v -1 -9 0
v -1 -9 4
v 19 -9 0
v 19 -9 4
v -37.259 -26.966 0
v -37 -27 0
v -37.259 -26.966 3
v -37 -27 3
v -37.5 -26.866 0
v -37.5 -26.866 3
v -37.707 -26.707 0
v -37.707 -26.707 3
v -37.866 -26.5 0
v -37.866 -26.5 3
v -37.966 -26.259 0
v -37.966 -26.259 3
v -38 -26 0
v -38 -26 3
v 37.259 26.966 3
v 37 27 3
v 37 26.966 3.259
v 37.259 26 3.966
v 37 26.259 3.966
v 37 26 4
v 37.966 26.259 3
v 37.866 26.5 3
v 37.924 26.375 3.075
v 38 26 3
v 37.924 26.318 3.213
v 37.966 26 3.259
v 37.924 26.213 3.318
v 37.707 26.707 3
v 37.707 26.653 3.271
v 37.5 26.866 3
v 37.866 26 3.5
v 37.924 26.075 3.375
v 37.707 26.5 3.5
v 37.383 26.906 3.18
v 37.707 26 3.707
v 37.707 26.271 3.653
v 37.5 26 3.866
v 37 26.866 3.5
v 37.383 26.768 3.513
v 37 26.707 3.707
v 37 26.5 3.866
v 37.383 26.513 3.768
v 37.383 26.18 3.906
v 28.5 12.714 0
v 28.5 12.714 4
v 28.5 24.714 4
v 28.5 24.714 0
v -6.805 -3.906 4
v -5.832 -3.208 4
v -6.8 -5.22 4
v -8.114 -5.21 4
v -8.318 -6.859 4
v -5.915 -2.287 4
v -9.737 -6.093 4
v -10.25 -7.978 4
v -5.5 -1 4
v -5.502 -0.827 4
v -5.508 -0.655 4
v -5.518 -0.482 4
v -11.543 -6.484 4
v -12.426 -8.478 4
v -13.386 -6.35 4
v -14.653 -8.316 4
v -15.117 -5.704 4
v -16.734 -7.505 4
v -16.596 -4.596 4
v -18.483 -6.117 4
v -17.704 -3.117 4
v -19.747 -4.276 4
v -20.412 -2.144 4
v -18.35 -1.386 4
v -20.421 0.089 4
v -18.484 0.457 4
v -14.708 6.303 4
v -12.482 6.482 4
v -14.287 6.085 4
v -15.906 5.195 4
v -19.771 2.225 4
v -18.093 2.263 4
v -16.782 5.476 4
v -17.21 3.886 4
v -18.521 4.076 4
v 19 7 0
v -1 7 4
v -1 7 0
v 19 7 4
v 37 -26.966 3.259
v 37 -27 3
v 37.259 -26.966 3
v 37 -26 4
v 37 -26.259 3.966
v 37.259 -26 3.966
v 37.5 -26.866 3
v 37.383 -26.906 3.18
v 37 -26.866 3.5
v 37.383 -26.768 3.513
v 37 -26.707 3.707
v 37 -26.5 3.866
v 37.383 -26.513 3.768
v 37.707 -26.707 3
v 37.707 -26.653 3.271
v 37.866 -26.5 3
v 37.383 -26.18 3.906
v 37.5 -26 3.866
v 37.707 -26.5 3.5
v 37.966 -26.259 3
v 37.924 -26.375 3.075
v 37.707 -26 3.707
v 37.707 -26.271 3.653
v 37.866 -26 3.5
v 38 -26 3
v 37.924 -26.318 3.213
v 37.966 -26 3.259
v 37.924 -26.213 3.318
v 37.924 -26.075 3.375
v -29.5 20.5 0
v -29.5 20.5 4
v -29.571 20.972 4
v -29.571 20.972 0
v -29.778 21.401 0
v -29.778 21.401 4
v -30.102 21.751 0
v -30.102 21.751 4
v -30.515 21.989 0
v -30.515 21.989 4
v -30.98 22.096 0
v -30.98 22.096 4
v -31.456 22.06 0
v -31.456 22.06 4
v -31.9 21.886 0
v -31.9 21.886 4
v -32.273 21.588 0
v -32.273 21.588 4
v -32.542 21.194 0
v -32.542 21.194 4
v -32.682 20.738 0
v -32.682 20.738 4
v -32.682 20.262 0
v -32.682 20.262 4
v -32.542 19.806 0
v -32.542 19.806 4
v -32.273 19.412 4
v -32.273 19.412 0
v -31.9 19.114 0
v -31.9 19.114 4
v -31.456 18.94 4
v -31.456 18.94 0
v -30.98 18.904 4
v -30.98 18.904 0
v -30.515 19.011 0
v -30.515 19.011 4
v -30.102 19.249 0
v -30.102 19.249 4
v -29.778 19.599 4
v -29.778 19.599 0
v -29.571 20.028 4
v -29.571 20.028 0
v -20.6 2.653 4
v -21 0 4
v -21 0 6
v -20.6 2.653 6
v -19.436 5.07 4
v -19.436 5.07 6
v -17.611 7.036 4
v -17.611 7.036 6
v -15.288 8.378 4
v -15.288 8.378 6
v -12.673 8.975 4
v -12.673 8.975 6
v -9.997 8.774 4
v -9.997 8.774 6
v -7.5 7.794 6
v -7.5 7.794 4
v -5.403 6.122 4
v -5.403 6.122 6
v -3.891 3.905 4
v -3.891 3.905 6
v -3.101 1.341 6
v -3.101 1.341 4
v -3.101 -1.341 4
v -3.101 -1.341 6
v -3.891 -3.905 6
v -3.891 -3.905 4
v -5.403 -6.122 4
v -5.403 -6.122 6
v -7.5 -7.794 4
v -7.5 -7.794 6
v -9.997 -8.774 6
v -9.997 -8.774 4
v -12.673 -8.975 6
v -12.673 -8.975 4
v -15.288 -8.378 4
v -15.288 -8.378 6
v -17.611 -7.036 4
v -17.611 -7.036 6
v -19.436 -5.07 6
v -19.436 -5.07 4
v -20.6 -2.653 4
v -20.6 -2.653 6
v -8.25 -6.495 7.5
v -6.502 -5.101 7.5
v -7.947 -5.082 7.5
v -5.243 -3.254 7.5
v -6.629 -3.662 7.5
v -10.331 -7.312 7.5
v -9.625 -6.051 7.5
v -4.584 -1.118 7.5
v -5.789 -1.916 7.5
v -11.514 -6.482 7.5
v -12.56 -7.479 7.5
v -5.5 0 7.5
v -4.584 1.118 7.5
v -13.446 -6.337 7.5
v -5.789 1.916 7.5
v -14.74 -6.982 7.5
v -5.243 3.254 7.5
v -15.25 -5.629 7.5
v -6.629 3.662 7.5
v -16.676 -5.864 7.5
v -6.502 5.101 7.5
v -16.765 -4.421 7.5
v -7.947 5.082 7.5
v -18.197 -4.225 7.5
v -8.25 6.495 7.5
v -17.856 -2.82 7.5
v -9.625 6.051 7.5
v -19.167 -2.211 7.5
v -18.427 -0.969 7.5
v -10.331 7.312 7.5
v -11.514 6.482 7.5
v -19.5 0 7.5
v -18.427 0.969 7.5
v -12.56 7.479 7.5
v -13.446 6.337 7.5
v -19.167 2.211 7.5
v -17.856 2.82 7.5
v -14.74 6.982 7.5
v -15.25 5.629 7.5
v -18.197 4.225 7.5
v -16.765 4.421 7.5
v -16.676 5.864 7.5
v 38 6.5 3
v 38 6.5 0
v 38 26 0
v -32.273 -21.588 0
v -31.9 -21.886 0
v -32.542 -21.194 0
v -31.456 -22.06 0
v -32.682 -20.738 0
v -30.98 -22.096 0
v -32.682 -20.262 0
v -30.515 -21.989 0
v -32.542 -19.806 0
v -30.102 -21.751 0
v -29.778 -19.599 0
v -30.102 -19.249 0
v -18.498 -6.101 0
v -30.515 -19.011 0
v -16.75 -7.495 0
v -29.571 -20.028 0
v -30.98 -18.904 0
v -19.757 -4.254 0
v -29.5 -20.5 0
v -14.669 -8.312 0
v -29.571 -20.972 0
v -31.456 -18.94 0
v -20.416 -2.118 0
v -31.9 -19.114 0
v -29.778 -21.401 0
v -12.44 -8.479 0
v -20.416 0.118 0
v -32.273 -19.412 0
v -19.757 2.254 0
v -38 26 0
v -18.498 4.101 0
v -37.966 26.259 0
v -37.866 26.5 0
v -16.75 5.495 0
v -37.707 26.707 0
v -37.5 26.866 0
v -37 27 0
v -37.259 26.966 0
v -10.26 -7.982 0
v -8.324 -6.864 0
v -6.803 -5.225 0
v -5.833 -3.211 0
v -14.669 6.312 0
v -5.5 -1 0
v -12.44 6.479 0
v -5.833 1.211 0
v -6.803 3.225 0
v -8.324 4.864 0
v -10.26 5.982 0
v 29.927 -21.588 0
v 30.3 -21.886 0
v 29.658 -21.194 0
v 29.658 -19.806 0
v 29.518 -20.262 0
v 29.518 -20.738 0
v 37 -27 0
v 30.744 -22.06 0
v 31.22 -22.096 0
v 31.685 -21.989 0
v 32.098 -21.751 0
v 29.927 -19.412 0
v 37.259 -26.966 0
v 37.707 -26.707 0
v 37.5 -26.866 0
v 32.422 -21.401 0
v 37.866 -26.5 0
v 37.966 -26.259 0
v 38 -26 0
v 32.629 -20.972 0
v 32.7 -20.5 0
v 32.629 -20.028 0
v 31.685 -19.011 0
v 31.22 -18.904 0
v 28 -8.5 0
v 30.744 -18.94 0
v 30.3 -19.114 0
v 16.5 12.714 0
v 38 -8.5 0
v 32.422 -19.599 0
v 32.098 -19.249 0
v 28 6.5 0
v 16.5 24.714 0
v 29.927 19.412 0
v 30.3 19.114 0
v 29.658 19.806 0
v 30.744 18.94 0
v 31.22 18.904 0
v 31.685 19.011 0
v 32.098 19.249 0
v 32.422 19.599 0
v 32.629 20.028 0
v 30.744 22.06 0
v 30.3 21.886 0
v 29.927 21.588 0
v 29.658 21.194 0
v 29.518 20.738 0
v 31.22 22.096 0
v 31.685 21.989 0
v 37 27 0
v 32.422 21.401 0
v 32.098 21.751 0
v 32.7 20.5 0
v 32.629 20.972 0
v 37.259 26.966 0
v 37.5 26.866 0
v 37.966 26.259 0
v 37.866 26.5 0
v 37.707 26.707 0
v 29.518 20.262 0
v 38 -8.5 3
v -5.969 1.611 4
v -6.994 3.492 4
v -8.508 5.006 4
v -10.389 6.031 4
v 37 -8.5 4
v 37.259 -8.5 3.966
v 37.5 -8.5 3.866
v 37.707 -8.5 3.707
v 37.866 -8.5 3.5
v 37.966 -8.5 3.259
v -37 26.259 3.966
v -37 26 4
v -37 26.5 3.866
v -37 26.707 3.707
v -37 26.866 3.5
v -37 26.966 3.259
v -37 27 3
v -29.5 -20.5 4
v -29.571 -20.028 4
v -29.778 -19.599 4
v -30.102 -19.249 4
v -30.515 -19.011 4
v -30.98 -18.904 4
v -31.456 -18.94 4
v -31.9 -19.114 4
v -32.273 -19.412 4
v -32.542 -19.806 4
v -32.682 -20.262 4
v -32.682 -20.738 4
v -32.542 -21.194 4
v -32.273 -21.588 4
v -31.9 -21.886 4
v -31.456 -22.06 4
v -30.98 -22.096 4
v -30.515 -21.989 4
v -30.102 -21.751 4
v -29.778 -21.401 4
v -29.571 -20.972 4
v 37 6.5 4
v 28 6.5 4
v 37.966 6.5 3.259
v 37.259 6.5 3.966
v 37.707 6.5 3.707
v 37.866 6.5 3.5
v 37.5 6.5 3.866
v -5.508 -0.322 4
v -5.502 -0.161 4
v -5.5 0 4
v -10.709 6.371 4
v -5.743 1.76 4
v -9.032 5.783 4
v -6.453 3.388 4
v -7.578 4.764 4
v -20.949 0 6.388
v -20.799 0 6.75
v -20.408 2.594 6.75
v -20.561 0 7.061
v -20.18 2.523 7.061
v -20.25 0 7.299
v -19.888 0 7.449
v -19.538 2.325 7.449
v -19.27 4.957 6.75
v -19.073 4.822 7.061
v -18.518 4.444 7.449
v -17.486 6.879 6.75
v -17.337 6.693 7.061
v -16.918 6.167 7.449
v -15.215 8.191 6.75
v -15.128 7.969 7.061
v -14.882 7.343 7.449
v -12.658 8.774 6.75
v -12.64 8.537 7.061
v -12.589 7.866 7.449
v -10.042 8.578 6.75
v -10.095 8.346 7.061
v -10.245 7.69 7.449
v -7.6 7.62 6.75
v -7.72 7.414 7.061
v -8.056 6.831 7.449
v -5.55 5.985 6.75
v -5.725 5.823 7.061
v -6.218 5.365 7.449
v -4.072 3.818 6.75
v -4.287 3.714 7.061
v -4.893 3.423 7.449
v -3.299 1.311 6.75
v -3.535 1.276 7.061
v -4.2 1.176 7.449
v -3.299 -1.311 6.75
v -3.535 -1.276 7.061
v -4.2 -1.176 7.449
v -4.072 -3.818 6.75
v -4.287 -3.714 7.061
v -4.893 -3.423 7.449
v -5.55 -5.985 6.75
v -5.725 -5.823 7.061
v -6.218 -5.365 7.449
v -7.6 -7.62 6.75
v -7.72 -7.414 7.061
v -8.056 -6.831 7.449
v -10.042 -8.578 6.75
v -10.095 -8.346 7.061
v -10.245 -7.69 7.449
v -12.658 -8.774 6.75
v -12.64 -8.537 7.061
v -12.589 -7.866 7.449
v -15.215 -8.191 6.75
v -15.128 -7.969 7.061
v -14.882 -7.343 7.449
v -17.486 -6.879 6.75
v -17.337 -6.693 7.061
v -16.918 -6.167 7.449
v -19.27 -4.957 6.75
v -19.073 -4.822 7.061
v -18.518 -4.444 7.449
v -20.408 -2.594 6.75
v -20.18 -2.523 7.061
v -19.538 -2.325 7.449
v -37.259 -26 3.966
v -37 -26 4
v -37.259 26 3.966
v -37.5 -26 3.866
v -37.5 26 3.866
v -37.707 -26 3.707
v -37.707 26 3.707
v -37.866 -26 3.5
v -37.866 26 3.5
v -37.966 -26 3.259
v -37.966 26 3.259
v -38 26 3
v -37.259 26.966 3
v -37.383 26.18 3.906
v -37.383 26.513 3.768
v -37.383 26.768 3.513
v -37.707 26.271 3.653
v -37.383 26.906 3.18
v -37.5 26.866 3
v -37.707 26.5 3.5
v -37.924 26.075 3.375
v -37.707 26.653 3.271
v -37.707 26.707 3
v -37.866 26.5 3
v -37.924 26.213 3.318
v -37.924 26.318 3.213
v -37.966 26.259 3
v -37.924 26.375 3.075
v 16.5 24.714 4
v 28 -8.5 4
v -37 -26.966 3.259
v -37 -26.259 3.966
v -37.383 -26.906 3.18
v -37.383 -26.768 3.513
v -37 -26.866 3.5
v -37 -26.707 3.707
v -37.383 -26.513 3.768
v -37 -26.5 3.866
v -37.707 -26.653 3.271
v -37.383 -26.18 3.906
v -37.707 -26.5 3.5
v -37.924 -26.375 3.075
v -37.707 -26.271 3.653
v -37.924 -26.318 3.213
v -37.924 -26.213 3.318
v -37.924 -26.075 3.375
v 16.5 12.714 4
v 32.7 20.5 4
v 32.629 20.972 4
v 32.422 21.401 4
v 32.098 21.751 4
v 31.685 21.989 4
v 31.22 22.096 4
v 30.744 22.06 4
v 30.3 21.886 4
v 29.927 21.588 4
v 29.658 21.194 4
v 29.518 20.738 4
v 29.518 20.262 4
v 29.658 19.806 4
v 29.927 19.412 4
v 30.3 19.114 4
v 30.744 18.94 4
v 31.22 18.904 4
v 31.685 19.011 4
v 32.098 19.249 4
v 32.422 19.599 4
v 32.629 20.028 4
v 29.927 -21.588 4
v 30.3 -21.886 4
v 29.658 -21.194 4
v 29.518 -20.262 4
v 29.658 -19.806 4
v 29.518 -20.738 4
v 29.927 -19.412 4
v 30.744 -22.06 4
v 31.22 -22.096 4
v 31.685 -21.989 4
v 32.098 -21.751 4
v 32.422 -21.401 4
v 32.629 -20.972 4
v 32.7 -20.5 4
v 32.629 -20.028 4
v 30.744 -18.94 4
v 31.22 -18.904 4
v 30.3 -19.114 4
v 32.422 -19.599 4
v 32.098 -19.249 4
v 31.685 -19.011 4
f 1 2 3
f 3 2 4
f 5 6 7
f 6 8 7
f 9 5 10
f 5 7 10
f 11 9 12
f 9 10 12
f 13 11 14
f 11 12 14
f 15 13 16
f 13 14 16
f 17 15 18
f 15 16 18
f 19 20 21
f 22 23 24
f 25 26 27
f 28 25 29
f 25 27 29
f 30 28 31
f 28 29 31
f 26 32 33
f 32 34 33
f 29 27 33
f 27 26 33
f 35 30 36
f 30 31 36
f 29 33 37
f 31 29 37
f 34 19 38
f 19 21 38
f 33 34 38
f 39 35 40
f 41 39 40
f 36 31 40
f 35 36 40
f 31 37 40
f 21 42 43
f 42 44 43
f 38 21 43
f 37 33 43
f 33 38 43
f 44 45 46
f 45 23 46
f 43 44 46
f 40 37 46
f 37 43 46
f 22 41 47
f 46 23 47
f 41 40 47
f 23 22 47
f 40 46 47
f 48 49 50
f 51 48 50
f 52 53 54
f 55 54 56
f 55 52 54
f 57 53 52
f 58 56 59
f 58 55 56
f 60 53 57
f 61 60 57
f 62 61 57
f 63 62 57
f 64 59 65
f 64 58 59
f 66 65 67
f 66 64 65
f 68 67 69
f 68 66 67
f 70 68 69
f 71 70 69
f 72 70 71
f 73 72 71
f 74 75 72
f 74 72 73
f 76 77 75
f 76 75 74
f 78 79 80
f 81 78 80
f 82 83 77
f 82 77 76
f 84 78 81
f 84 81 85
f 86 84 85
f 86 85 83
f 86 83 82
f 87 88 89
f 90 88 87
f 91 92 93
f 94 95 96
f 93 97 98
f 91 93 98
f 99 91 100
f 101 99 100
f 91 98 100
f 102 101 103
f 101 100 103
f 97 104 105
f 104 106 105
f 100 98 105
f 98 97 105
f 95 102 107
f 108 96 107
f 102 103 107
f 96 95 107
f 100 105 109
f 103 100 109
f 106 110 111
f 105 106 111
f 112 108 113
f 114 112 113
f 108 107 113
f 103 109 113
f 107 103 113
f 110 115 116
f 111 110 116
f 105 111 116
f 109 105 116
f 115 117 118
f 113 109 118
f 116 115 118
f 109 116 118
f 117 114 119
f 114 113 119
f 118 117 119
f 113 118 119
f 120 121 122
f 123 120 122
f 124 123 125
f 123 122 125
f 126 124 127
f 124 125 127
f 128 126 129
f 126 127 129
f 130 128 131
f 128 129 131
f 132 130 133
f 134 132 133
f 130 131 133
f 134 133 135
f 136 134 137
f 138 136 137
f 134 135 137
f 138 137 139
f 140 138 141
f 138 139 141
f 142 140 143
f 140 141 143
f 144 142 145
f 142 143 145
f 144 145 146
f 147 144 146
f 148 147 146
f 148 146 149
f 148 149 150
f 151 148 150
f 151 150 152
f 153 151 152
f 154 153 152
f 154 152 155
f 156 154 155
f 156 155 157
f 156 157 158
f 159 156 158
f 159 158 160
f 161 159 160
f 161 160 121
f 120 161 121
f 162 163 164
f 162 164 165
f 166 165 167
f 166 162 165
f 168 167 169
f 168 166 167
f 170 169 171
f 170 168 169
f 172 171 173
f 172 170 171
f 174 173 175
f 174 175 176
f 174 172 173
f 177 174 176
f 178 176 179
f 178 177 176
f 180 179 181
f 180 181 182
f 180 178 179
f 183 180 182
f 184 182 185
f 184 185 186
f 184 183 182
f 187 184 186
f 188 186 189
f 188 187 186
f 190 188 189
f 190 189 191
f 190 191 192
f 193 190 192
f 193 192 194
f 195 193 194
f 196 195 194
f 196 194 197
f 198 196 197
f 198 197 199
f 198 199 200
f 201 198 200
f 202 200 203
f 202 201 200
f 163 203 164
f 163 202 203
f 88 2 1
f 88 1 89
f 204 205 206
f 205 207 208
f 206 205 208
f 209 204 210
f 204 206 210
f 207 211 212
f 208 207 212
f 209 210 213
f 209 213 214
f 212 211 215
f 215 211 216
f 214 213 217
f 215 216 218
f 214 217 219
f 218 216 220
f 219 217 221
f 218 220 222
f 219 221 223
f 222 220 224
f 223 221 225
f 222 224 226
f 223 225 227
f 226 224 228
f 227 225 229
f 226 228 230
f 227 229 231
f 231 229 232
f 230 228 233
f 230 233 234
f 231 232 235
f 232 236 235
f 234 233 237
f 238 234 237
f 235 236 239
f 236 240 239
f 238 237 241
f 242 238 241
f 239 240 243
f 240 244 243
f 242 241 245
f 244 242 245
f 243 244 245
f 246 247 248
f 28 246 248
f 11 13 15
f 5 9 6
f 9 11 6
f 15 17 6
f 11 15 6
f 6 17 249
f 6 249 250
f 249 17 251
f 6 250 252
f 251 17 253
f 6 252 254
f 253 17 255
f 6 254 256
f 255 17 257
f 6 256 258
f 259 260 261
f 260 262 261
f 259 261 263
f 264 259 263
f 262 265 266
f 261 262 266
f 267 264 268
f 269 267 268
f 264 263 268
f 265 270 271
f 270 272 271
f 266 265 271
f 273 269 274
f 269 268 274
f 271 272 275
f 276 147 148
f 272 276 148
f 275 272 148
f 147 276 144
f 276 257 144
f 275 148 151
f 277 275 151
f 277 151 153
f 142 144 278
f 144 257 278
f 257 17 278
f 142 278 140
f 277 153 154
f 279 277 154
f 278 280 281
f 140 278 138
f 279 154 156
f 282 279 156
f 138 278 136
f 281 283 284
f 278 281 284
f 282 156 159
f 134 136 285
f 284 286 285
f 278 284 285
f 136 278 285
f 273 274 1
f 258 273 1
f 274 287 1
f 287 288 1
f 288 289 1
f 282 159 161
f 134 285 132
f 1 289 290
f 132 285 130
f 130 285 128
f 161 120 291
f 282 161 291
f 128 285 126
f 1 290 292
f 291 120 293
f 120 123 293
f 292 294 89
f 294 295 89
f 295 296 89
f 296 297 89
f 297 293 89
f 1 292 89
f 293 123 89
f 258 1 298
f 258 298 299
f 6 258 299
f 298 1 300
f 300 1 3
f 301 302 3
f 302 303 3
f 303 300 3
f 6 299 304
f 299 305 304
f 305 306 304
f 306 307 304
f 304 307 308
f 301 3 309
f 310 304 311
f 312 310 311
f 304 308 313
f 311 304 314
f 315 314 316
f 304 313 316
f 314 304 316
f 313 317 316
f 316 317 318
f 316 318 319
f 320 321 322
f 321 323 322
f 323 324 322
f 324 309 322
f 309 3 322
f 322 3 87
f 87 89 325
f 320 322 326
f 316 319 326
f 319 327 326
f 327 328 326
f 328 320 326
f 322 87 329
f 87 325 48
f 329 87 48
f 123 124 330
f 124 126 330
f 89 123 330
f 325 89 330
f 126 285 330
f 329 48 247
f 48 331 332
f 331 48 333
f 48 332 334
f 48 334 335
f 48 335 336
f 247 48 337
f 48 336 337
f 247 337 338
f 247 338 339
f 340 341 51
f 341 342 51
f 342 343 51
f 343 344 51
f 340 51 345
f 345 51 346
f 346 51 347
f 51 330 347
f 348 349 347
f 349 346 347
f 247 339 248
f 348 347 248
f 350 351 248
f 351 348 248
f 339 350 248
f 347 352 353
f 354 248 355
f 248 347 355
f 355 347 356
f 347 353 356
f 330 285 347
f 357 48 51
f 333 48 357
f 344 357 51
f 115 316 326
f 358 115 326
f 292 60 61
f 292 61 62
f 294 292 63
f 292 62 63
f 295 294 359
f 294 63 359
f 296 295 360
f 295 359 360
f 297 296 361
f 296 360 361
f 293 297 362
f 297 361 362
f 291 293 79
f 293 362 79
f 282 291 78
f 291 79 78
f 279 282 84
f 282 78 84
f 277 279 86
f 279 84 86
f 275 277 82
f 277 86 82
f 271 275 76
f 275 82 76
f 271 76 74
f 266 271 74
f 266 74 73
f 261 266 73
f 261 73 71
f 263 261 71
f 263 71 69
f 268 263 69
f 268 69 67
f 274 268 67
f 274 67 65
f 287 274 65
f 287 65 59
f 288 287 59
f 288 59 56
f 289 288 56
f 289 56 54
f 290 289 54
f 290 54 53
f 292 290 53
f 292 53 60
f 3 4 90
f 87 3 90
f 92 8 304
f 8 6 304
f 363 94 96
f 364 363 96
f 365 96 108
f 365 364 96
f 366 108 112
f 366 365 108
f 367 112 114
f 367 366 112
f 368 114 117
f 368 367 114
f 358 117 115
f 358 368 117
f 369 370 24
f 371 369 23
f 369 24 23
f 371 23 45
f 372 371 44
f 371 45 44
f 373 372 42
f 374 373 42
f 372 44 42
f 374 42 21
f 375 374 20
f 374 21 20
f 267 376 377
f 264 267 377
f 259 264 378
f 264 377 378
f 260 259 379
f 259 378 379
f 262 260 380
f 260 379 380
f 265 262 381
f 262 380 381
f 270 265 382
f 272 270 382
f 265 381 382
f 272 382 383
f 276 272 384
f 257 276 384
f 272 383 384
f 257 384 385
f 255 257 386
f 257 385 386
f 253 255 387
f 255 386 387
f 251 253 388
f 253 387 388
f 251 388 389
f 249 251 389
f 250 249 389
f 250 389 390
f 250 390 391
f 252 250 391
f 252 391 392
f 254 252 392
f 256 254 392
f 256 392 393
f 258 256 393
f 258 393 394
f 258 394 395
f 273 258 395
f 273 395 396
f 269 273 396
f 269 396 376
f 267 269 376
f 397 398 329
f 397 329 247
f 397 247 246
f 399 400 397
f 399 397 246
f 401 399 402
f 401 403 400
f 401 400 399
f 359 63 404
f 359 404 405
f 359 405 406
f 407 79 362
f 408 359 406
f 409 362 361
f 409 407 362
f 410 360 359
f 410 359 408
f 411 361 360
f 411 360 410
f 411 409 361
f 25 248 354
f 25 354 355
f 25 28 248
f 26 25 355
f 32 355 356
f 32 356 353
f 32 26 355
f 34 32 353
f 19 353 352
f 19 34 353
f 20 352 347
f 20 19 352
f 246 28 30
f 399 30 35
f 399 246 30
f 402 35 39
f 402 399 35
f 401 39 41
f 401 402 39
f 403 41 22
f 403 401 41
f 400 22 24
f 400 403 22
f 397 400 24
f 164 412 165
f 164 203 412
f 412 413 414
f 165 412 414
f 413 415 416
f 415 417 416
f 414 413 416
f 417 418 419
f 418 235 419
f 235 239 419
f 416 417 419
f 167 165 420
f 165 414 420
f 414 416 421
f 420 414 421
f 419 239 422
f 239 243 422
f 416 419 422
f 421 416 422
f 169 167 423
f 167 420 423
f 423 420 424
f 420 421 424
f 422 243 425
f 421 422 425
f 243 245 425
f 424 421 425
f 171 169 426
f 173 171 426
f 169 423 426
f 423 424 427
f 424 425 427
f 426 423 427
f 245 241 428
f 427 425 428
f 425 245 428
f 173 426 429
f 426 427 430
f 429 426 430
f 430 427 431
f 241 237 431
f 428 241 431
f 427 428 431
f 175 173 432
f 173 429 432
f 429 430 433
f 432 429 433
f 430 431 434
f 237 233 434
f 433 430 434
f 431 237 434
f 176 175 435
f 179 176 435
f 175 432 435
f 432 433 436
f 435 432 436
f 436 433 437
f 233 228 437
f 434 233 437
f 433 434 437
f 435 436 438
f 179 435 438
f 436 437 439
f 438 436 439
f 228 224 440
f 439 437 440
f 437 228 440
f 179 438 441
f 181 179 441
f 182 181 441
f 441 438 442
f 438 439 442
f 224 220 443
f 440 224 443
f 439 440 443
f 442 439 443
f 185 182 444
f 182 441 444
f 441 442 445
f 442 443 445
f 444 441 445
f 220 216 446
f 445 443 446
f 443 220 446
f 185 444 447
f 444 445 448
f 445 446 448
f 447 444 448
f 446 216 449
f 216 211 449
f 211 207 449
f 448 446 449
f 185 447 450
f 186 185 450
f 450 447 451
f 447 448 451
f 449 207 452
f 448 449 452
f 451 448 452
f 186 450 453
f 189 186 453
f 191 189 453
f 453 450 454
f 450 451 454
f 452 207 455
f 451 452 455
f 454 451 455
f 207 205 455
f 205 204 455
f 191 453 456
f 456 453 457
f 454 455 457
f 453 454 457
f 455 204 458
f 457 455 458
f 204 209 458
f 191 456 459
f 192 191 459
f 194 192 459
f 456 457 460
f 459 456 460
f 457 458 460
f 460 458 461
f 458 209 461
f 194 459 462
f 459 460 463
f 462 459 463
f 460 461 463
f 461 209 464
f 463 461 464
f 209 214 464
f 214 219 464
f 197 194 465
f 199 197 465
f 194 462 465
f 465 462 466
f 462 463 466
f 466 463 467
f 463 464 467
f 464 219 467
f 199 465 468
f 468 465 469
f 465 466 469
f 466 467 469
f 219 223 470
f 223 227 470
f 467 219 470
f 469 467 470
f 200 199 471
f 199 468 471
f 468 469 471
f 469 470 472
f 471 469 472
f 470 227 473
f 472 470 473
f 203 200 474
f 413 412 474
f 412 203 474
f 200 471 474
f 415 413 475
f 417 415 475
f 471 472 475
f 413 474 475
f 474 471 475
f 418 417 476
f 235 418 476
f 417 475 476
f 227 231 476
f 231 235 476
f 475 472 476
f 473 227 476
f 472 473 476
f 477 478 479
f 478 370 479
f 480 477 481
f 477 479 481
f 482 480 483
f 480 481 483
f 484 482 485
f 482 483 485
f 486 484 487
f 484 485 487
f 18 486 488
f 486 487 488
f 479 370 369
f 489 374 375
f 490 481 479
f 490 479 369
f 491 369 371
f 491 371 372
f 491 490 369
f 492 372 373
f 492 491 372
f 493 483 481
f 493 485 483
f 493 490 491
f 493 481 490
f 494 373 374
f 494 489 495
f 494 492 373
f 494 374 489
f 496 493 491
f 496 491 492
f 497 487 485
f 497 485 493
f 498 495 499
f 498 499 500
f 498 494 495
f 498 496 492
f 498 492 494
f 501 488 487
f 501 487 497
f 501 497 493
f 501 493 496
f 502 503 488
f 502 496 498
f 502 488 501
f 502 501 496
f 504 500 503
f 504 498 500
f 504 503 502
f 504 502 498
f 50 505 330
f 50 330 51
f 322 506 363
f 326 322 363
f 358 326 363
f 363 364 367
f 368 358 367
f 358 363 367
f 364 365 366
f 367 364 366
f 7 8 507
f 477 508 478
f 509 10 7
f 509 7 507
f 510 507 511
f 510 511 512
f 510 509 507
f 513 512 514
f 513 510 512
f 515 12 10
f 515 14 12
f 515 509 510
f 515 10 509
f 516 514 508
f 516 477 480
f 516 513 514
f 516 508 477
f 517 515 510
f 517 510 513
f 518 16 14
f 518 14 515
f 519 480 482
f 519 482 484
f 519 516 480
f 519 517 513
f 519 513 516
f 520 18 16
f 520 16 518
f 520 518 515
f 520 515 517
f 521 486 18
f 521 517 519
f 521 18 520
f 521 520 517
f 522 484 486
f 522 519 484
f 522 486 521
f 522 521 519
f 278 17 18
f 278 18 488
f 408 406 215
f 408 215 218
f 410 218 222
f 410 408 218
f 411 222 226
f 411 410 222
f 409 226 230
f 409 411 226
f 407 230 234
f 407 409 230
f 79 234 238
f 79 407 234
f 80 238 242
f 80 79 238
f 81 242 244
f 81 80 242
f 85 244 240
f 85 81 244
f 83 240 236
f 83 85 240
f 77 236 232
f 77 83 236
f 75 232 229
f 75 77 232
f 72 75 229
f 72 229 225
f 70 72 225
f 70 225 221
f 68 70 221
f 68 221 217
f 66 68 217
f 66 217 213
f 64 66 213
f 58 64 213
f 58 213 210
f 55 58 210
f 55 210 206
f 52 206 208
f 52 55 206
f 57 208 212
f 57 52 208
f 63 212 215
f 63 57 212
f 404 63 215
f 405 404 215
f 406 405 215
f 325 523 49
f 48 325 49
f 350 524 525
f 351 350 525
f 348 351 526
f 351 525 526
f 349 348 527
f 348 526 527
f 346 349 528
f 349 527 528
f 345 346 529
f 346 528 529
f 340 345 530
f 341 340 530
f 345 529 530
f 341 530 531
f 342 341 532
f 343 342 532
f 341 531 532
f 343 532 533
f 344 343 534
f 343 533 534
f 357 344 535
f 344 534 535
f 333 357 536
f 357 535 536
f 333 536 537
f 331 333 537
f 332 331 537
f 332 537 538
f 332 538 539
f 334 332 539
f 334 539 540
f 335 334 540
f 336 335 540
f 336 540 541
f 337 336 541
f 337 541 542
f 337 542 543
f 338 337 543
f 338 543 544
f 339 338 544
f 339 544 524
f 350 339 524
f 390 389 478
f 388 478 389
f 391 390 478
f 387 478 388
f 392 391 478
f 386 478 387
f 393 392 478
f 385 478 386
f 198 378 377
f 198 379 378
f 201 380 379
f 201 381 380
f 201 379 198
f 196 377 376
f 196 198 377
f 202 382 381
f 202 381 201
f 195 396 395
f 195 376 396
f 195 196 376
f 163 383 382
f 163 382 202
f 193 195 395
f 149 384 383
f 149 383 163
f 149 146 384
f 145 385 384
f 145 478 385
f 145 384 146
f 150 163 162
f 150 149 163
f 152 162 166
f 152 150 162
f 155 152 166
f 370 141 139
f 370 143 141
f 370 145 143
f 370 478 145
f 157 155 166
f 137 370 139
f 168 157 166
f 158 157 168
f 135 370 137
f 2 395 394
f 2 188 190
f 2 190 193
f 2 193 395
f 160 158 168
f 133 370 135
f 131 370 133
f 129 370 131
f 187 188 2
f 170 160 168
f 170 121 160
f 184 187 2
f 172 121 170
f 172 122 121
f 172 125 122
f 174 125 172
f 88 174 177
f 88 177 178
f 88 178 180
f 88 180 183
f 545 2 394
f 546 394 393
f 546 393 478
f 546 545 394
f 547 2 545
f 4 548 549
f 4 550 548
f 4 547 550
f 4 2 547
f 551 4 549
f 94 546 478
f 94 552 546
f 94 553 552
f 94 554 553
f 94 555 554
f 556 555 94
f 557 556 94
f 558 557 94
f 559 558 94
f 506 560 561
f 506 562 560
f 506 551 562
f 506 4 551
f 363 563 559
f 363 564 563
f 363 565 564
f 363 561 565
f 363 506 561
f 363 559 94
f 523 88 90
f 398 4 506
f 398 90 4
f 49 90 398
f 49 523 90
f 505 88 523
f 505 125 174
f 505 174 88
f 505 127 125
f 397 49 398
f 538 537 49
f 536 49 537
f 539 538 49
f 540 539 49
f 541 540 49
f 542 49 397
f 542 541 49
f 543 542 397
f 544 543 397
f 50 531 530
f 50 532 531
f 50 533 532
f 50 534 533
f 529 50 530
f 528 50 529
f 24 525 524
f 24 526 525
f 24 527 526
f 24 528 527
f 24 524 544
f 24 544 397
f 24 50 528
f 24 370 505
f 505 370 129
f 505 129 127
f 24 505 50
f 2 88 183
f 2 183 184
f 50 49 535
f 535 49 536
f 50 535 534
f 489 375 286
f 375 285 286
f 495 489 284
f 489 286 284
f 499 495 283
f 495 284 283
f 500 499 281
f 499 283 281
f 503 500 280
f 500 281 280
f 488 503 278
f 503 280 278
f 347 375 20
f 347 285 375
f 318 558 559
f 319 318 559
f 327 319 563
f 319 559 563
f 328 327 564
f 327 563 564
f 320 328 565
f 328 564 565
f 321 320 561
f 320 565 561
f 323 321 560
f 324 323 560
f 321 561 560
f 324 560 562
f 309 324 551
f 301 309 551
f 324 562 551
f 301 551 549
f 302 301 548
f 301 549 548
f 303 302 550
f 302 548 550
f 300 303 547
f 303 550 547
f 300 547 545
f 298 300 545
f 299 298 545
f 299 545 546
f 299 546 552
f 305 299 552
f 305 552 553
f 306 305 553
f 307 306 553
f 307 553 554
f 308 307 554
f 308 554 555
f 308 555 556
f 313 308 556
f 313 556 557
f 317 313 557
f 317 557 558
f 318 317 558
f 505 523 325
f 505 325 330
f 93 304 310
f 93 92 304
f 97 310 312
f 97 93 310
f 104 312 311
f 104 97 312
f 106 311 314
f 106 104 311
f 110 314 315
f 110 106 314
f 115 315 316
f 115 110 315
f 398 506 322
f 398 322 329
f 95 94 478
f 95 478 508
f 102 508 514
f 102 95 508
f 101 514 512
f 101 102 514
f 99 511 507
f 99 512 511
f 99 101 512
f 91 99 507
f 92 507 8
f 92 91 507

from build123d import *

# Parameters (mm, degrees)
ENCLOSURE_TOP_SKETCH_W          = 76
ENCLOSURE_TOP_SKETCH_H          = 54
ENCLOSURE_TOP_FEATURE_DEPTH     = 4
SCREW_HOLES_SKETCH_R            = 1.6
SCREW_HOLES_FEATURE_DEPTH       = 5
CAMERA_LIGHT_HOLE_SKETCH_R      = 7.5
CAMERA_LIGHT_HOLE_SKETCH_W      = 20
CAMERA_LIGHT_HOLE_SKETCH_H      = 16
CAMERA_LIGHT_HOLE_SKETCH_W_2    = 10
CAMERA_LIGHT_HOLE_SKETCH_H_2    = 15
CAMERA_LIGHT_HOLE_SKETCH_W_3    = 12
CAMERA_LIGHT_HOLE_SKETCH_H_3    = 12
CAMERA_LIGHT_HOLE_FEATURE_DEPTH = 5
FILTER_COVER_SKETCH_R           = 9
FILTER_COVER_FEATURE_DEPTH      = 3.5
FILTER_HOLE_SKETCH_R            = 6.5
FILTER_HOLE_CUT_DEPTH           = 3.5
FILLET6_R                       = 1.5
FILLET7_R                       = 1
FILLET8_R                       = 1
FILLET9_R                       = 1
FILLET10_R                      = 1
FILLET11_R                      = 1


with BuildPart() as part:
    # Enclosure Top Sketch → Enclosure Top Feature (new body)
    with BuildSketch(Plane.XY):
        Rectangle(ENCLOSURE_TOP_SKETCH_W, ENCLOSURE_TOP_SKETCH_H)
    extrude(amount=ENCLOSURE_TOP_FEATURE_DEPTH)

    # Screw Holes Sketch → Screw Holes Feature (cut, through all)
    with BuildSketch(Plane.XY.offset(4)):
        with Locations((-31.1, 20.5)):
            Circle(SCREW_HOLES_SKETCH_R)
        with Locations((31.1, 20.5)):
            Circle(SCREW_HOLES_SKETCH_R)
        with Locations((31.1, -20.5)):
            Circle(SCREW_HOLES_SKETCH_R)
        with Locations((-31.1, -20.5)):
            Circle(SCREW_HOLES_SKETCH_R)
    extrude(amount=-SCREW_HOLES_FEATURE_DEPTH, mode=Mode.SUBTRACT)

    # Camera + Light Hole Sketch → Camera _ Light Hole Feature (cut, through all)
    with BuildSketch(Plane.XY.offset(4)):
        with Locations((-13, -1)):
            Circle(CAMERA_LIGHT_HOLE_SKETCH_R)
        with Locations((9, -1)):
            Rectangle(CAMERA_LIGHT_HOLE_SKETCH_W, CAMERA_LIGHT_HOLE_SKETCH_H)
        with Locations((33, -1)):
            Rectangle(CAMERA_LIGHT_HOLE_SKETCH_W_2, CAMERA_LIGHT_HOLE_SKETCH_H_2)
        with Locations((22.5, 18.714)):
            Rectangle(CAMERA_LIGHT_HOLE_SKETCH_W_3, CAMERA_LIGHT_HOLE_SKETCH_H_3)
    extrude(amount=-CAMERA_LIGHT_HOLE_FEATURE_DEPTH, mode=Mode.SUBTRACT)

    # Filter Cover Sketch → Filter Cover Feature (add)
    with BuildSketch(Plane(origin=(0, 0, 4), x_dir=(-1, 0, 0), z_dir=(0, 0, -1))):
        with Locations((12, 0)):
            Circle(FILTER_COVER_SKETCH_R)
    extrude(amount=-FILTER_COVER_FEATURE_DEPTH)

    # Filter Hole Sketch → Filter Hole Cut (cut)
    with BuildSketch(Plane.XY.offset(4)):
        with Locations((-12, 0)):
            Circle(FILTER_HOLE_SKETCH_R)
    extrude(amount=FILTER_HOLE_CUT_DEPTH, mode=Mode.SUBTRACT)

    # Fillet6
    fillet6_edges = [part.edges().sort_by_distance(p)[0] for p in [
        (-3, 0, 7.5),
    ]]
    fillet(fillet6_edges, radius=FILLET6_R)

    # Fillet7
    fillet7_edges = [part.edges().sort_by_distance(p)[0] for p in [
        (0, 27, 4),
    ]]
    fillet(fillet7_edges, radius=FILLET7_R)

    # Fillet8
    fillet8_edges = [part.edges().sort_by_distance(p)[0] for p in [
        (0, -27, 4),
    ]]
    fillet(fillet8_edges, radius=FILLET8_R)

    # Fillet9
    fillet9_edges = [part.edges().sort_by_distance(p)[0] for p in [
        (-38, 0, 4),
        (-38, 27, 1.5),
        (-38, 26.707106781, 3.707106781),
        (-38, -27, 1.5),
        (-38, -26.707106781, 3.707106781),
    ]]
    fillet(fillet9_edges, radius=FILLET9_R)

    # Fillet10
    fillet10_edges = [part.edges().sort_by_distance(p)[0] for p in [
        (38, 27, 1.5),
        (38, 26.707106781, 3.707106781),
        (38, 16.25, 4),
    ]]
    fillet(fillet10_edges, radius=FILLET10_R)

    # Fillet11
    fillet11_edges = [part.edges().sort_by_distance(p)[0] for p in [
        (38, -17.25, 4),
        (38, -27, 1.5),
        (38, -26.707106781, 3.707106781),
    ]]
    fillet(fillet11_edges, radius=FILLET11_R)


solid = part.part
